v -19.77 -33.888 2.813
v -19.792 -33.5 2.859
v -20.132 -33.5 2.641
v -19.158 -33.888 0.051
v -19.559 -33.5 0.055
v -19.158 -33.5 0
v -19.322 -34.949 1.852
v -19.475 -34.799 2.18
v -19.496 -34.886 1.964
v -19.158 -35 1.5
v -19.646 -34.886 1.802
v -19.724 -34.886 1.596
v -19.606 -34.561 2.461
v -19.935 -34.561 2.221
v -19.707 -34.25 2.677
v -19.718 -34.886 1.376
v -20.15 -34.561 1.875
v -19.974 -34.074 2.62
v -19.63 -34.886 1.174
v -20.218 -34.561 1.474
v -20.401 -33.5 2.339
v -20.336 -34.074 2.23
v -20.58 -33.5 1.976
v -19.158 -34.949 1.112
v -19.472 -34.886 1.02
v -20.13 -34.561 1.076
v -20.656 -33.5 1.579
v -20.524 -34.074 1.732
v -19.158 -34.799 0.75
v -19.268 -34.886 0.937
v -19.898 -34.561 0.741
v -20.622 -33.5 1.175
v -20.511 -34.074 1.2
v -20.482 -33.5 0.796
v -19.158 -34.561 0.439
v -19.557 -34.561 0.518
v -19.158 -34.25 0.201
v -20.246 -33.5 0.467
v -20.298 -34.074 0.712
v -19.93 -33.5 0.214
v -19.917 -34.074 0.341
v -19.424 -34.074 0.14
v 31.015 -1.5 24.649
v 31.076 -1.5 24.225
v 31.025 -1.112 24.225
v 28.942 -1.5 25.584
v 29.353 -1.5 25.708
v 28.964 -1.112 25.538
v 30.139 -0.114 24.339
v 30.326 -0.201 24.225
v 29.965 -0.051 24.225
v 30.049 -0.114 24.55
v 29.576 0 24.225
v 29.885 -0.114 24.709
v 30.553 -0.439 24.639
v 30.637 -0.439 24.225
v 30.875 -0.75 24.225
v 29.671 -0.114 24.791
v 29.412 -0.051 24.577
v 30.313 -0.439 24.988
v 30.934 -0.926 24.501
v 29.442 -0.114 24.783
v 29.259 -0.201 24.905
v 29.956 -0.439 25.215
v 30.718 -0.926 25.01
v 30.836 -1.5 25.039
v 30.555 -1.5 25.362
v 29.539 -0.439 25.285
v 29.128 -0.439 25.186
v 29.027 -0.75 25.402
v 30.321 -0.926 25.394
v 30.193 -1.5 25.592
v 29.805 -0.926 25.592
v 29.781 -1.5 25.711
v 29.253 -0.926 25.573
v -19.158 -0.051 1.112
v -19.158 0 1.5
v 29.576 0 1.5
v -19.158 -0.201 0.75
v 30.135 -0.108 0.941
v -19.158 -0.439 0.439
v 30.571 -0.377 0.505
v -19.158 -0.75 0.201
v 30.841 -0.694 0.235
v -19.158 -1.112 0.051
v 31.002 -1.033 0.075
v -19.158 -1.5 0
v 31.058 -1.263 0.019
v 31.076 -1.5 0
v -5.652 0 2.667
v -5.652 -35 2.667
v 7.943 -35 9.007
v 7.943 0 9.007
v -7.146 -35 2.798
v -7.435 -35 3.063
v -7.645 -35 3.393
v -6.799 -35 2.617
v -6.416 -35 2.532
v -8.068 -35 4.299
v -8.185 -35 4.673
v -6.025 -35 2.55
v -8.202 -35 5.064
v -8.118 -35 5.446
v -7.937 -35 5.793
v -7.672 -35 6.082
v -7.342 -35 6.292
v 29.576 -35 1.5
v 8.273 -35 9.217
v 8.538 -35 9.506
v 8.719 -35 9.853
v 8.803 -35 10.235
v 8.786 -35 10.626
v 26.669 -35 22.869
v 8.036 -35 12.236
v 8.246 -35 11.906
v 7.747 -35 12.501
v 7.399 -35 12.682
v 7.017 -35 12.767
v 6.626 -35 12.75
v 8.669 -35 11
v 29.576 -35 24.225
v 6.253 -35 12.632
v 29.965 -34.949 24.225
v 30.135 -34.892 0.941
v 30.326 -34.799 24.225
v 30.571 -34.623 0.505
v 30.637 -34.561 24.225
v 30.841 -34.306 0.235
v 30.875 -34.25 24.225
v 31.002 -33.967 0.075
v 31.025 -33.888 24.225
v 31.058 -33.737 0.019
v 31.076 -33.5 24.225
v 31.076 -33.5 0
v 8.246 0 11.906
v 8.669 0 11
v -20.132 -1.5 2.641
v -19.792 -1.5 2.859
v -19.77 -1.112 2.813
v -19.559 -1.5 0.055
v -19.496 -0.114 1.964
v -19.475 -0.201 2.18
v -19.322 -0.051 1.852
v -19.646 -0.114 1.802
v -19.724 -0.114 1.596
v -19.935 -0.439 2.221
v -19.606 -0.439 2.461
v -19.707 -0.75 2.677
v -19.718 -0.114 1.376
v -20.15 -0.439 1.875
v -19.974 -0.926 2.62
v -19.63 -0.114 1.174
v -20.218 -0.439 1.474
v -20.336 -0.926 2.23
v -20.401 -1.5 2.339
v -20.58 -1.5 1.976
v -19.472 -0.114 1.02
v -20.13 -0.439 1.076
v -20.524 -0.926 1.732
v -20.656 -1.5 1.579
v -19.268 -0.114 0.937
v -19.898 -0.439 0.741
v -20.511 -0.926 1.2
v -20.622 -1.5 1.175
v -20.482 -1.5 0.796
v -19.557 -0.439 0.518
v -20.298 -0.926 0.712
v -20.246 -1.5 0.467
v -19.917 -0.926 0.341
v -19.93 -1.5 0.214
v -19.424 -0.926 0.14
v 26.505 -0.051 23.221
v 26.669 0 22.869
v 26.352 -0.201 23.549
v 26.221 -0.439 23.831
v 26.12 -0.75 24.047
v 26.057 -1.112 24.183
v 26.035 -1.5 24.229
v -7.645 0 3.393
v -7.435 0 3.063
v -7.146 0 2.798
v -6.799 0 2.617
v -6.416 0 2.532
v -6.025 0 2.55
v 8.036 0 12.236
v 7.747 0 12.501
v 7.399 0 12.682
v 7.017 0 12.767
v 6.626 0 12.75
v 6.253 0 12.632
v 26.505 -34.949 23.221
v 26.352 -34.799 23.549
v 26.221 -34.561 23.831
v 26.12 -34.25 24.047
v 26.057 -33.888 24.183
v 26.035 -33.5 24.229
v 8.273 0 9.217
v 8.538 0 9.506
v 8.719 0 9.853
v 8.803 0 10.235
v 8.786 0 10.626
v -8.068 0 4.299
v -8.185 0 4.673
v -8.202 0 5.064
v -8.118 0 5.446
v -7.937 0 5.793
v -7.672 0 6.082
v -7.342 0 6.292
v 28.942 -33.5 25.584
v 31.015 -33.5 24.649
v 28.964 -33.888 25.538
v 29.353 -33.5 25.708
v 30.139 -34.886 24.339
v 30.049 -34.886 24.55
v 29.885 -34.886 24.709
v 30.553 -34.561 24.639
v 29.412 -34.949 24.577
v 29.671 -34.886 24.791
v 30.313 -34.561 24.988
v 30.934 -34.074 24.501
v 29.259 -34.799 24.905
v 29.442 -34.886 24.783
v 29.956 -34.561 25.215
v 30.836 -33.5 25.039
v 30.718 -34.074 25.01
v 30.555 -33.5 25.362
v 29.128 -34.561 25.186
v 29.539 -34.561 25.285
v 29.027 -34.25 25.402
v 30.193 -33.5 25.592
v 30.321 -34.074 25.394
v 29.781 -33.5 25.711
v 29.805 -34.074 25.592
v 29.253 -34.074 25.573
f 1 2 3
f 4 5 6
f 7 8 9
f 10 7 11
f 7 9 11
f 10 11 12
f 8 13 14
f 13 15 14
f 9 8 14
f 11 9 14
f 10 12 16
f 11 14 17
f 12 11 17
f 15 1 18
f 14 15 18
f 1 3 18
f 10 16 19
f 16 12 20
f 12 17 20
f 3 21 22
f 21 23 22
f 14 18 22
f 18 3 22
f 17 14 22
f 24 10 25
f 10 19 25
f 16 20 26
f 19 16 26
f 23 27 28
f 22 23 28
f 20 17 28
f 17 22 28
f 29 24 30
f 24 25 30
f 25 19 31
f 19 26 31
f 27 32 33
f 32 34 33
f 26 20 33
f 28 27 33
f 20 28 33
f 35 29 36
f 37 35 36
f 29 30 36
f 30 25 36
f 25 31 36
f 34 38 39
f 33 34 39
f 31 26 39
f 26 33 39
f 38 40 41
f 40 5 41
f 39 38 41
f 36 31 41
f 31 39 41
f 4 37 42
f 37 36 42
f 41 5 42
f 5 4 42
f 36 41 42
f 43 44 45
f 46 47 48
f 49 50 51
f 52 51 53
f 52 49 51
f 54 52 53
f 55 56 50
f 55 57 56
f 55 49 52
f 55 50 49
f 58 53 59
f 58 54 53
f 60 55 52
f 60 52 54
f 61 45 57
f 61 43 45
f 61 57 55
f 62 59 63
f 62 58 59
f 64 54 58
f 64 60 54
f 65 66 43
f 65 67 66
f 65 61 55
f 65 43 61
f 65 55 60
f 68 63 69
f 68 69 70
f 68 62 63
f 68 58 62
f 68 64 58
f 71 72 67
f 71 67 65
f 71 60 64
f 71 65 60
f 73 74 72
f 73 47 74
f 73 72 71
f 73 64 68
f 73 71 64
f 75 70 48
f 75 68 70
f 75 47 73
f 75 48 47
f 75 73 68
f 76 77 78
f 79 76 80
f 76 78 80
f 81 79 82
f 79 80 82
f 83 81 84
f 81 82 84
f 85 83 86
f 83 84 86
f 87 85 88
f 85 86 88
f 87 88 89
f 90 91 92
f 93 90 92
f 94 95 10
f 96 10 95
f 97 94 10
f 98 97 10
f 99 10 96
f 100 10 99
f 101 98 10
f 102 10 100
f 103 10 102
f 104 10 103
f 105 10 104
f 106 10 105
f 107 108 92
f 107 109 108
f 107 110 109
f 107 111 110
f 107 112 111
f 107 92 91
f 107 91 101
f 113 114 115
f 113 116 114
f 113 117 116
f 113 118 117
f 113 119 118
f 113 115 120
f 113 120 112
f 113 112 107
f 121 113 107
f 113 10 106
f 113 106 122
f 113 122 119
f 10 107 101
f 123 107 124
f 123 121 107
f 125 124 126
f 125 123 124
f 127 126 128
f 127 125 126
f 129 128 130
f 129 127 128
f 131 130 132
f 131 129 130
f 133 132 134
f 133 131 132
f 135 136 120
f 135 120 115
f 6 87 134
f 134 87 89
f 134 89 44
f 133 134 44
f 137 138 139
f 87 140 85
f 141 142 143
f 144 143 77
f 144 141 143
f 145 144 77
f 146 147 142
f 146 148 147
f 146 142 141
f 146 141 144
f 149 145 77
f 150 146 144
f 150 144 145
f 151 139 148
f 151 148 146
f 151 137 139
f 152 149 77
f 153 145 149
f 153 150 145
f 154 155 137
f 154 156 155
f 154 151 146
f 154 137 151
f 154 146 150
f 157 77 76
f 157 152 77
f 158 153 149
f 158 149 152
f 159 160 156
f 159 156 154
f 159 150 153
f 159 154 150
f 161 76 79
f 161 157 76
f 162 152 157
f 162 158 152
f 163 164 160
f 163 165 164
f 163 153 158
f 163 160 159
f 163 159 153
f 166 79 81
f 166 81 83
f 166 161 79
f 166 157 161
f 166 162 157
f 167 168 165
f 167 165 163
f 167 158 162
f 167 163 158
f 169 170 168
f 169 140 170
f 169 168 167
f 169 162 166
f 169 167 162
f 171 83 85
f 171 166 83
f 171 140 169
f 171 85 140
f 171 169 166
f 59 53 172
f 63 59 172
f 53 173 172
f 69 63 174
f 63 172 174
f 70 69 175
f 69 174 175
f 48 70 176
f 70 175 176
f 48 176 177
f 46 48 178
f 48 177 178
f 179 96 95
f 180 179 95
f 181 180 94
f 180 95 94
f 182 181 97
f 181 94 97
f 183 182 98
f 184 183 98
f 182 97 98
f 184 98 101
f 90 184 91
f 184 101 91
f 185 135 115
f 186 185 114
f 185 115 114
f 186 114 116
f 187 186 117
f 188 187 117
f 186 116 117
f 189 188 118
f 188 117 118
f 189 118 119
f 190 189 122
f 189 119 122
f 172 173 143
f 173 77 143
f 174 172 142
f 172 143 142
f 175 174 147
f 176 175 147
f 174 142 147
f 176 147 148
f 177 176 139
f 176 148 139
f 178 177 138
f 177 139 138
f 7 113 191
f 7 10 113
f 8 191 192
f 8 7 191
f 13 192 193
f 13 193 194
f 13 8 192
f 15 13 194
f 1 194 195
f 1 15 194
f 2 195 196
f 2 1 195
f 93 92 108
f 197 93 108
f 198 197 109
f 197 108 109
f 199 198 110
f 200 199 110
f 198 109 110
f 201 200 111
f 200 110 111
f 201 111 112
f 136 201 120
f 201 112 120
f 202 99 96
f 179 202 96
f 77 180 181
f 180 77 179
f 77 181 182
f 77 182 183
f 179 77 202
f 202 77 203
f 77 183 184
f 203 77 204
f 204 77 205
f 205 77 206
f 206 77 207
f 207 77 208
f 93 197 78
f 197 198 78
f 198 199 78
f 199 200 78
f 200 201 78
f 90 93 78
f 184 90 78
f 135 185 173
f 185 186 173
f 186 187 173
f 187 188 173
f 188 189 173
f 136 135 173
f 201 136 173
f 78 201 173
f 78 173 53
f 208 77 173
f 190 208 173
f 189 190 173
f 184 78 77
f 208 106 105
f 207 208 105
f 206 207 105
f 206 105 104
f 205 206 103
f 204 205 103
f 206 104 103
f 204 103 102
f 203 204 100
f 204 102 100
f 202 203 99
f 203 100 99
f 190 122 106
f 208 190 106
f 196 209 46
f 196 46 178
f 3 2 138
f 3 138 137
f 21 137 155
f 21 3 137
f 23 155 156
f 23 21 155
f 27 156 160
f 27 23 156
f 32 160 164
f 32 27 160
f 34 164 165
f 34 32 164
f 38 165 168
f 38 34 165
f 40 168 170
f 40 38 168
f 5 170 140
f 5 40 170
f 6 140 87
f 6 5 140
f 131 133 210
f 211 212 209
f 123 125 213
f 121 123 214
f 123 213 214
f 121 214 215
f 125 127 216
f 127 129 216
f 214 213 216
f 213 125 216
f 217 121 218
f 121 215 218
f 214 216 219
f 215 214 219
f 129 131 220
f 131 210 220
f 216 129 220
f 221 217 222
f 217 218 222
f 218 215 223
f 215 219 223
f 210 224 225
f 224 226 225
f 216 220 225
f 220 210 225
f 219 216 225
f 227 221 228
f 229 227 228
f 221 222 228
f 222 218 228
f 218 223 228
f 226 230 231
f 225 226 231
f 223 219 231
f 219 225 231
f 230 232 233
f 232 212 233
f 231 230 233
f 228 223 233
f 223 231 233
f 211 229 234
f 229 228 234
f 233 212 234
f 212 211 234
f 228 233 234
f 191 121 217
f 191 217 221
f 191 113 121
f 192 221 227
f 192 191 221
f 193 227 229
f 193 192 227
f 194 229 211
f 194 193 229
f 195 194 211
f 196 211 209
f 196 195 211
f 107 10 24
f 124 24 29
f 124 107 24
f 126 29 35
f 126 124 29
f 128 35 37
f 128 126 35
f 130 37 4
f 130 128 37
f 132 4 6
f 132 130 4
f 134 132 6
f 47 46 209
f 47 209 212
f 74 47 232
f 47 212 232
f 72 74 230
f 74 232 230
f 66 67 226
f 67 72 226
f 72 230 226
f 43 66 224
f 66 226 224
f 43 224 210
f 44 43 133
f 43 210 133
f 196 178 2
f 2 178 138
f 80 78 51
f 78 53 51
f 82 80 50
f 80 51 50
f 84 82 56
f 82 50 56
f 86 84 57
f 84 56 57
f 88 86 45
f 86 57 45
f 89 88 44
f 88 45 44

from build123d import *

# Parameters (mm, degrees)
F1_DEPTH = 35
F3_DEPTH = 35.001
F4_R     = 1.5
F5_R     = 1.5


with BuildPart() as f1:
    # F0 (on Front) → F1 (new body)
    with BuildSketch(Plane.XZ):
        Polygon((26.035348, 24.228908), (-25.923712, 0), (31.076288, 0), (31.076288, 26.579537), align=None)
    extrude(amount=F1_DEPTH)

    # F2 (on face) → F3 (cut, through all)
    with BuildSketch(Plane.XZ.offset(35)):
        with BuildLine():
            Line((6.252536, 12.631768), (-7.342081, 6.292494))
            ThreePointArc((-7.342081, 6.292494), (-8.117693, 5.446063), (-8.067615, 4.299105))
            Line((-8.067615, 4.299105), (-7.644997, 3.392798))
            ThreePointArc((-7.644997, 3.392798), (-6.798566, 2.617186), (-5.651608, 2.667263))
            Line((-5.651608, 2.667263), (7.943009, 9.006537))
            ThreePointArc((7.943009, 9.006537), (8.71862, 9.852969), (8.668543, 10.999926))
            Line((8.668543, 10.999926), (8.245925, 11.906234))
            ThreePointArc((8.245925, 11.906234), (7.399493, 12.681846), (6.252536, 12.631768))
        make_face()
    extrude(amount=-F3_DEPTH, mode=Mode.SUBTRACT)

    # F4
    f4_edges = [f1.edges().sort_by_distance(p)[0] for p in [
        (-25.923712, -17.5, 0),
        (31.076288, -17.5, 26.579537),
    ]]
    fillet(f4_edges, radius=F4_R)

    # F5
    f5_edges = [f1.edges().sort_by_distance(p)[0] for p in [
        (31.076288, -35, 12.112504),
        (31.076288, 0, 12.112504),
    ]]
    fillet(f5_edges, radius=F5_R)


solid = f1.part
